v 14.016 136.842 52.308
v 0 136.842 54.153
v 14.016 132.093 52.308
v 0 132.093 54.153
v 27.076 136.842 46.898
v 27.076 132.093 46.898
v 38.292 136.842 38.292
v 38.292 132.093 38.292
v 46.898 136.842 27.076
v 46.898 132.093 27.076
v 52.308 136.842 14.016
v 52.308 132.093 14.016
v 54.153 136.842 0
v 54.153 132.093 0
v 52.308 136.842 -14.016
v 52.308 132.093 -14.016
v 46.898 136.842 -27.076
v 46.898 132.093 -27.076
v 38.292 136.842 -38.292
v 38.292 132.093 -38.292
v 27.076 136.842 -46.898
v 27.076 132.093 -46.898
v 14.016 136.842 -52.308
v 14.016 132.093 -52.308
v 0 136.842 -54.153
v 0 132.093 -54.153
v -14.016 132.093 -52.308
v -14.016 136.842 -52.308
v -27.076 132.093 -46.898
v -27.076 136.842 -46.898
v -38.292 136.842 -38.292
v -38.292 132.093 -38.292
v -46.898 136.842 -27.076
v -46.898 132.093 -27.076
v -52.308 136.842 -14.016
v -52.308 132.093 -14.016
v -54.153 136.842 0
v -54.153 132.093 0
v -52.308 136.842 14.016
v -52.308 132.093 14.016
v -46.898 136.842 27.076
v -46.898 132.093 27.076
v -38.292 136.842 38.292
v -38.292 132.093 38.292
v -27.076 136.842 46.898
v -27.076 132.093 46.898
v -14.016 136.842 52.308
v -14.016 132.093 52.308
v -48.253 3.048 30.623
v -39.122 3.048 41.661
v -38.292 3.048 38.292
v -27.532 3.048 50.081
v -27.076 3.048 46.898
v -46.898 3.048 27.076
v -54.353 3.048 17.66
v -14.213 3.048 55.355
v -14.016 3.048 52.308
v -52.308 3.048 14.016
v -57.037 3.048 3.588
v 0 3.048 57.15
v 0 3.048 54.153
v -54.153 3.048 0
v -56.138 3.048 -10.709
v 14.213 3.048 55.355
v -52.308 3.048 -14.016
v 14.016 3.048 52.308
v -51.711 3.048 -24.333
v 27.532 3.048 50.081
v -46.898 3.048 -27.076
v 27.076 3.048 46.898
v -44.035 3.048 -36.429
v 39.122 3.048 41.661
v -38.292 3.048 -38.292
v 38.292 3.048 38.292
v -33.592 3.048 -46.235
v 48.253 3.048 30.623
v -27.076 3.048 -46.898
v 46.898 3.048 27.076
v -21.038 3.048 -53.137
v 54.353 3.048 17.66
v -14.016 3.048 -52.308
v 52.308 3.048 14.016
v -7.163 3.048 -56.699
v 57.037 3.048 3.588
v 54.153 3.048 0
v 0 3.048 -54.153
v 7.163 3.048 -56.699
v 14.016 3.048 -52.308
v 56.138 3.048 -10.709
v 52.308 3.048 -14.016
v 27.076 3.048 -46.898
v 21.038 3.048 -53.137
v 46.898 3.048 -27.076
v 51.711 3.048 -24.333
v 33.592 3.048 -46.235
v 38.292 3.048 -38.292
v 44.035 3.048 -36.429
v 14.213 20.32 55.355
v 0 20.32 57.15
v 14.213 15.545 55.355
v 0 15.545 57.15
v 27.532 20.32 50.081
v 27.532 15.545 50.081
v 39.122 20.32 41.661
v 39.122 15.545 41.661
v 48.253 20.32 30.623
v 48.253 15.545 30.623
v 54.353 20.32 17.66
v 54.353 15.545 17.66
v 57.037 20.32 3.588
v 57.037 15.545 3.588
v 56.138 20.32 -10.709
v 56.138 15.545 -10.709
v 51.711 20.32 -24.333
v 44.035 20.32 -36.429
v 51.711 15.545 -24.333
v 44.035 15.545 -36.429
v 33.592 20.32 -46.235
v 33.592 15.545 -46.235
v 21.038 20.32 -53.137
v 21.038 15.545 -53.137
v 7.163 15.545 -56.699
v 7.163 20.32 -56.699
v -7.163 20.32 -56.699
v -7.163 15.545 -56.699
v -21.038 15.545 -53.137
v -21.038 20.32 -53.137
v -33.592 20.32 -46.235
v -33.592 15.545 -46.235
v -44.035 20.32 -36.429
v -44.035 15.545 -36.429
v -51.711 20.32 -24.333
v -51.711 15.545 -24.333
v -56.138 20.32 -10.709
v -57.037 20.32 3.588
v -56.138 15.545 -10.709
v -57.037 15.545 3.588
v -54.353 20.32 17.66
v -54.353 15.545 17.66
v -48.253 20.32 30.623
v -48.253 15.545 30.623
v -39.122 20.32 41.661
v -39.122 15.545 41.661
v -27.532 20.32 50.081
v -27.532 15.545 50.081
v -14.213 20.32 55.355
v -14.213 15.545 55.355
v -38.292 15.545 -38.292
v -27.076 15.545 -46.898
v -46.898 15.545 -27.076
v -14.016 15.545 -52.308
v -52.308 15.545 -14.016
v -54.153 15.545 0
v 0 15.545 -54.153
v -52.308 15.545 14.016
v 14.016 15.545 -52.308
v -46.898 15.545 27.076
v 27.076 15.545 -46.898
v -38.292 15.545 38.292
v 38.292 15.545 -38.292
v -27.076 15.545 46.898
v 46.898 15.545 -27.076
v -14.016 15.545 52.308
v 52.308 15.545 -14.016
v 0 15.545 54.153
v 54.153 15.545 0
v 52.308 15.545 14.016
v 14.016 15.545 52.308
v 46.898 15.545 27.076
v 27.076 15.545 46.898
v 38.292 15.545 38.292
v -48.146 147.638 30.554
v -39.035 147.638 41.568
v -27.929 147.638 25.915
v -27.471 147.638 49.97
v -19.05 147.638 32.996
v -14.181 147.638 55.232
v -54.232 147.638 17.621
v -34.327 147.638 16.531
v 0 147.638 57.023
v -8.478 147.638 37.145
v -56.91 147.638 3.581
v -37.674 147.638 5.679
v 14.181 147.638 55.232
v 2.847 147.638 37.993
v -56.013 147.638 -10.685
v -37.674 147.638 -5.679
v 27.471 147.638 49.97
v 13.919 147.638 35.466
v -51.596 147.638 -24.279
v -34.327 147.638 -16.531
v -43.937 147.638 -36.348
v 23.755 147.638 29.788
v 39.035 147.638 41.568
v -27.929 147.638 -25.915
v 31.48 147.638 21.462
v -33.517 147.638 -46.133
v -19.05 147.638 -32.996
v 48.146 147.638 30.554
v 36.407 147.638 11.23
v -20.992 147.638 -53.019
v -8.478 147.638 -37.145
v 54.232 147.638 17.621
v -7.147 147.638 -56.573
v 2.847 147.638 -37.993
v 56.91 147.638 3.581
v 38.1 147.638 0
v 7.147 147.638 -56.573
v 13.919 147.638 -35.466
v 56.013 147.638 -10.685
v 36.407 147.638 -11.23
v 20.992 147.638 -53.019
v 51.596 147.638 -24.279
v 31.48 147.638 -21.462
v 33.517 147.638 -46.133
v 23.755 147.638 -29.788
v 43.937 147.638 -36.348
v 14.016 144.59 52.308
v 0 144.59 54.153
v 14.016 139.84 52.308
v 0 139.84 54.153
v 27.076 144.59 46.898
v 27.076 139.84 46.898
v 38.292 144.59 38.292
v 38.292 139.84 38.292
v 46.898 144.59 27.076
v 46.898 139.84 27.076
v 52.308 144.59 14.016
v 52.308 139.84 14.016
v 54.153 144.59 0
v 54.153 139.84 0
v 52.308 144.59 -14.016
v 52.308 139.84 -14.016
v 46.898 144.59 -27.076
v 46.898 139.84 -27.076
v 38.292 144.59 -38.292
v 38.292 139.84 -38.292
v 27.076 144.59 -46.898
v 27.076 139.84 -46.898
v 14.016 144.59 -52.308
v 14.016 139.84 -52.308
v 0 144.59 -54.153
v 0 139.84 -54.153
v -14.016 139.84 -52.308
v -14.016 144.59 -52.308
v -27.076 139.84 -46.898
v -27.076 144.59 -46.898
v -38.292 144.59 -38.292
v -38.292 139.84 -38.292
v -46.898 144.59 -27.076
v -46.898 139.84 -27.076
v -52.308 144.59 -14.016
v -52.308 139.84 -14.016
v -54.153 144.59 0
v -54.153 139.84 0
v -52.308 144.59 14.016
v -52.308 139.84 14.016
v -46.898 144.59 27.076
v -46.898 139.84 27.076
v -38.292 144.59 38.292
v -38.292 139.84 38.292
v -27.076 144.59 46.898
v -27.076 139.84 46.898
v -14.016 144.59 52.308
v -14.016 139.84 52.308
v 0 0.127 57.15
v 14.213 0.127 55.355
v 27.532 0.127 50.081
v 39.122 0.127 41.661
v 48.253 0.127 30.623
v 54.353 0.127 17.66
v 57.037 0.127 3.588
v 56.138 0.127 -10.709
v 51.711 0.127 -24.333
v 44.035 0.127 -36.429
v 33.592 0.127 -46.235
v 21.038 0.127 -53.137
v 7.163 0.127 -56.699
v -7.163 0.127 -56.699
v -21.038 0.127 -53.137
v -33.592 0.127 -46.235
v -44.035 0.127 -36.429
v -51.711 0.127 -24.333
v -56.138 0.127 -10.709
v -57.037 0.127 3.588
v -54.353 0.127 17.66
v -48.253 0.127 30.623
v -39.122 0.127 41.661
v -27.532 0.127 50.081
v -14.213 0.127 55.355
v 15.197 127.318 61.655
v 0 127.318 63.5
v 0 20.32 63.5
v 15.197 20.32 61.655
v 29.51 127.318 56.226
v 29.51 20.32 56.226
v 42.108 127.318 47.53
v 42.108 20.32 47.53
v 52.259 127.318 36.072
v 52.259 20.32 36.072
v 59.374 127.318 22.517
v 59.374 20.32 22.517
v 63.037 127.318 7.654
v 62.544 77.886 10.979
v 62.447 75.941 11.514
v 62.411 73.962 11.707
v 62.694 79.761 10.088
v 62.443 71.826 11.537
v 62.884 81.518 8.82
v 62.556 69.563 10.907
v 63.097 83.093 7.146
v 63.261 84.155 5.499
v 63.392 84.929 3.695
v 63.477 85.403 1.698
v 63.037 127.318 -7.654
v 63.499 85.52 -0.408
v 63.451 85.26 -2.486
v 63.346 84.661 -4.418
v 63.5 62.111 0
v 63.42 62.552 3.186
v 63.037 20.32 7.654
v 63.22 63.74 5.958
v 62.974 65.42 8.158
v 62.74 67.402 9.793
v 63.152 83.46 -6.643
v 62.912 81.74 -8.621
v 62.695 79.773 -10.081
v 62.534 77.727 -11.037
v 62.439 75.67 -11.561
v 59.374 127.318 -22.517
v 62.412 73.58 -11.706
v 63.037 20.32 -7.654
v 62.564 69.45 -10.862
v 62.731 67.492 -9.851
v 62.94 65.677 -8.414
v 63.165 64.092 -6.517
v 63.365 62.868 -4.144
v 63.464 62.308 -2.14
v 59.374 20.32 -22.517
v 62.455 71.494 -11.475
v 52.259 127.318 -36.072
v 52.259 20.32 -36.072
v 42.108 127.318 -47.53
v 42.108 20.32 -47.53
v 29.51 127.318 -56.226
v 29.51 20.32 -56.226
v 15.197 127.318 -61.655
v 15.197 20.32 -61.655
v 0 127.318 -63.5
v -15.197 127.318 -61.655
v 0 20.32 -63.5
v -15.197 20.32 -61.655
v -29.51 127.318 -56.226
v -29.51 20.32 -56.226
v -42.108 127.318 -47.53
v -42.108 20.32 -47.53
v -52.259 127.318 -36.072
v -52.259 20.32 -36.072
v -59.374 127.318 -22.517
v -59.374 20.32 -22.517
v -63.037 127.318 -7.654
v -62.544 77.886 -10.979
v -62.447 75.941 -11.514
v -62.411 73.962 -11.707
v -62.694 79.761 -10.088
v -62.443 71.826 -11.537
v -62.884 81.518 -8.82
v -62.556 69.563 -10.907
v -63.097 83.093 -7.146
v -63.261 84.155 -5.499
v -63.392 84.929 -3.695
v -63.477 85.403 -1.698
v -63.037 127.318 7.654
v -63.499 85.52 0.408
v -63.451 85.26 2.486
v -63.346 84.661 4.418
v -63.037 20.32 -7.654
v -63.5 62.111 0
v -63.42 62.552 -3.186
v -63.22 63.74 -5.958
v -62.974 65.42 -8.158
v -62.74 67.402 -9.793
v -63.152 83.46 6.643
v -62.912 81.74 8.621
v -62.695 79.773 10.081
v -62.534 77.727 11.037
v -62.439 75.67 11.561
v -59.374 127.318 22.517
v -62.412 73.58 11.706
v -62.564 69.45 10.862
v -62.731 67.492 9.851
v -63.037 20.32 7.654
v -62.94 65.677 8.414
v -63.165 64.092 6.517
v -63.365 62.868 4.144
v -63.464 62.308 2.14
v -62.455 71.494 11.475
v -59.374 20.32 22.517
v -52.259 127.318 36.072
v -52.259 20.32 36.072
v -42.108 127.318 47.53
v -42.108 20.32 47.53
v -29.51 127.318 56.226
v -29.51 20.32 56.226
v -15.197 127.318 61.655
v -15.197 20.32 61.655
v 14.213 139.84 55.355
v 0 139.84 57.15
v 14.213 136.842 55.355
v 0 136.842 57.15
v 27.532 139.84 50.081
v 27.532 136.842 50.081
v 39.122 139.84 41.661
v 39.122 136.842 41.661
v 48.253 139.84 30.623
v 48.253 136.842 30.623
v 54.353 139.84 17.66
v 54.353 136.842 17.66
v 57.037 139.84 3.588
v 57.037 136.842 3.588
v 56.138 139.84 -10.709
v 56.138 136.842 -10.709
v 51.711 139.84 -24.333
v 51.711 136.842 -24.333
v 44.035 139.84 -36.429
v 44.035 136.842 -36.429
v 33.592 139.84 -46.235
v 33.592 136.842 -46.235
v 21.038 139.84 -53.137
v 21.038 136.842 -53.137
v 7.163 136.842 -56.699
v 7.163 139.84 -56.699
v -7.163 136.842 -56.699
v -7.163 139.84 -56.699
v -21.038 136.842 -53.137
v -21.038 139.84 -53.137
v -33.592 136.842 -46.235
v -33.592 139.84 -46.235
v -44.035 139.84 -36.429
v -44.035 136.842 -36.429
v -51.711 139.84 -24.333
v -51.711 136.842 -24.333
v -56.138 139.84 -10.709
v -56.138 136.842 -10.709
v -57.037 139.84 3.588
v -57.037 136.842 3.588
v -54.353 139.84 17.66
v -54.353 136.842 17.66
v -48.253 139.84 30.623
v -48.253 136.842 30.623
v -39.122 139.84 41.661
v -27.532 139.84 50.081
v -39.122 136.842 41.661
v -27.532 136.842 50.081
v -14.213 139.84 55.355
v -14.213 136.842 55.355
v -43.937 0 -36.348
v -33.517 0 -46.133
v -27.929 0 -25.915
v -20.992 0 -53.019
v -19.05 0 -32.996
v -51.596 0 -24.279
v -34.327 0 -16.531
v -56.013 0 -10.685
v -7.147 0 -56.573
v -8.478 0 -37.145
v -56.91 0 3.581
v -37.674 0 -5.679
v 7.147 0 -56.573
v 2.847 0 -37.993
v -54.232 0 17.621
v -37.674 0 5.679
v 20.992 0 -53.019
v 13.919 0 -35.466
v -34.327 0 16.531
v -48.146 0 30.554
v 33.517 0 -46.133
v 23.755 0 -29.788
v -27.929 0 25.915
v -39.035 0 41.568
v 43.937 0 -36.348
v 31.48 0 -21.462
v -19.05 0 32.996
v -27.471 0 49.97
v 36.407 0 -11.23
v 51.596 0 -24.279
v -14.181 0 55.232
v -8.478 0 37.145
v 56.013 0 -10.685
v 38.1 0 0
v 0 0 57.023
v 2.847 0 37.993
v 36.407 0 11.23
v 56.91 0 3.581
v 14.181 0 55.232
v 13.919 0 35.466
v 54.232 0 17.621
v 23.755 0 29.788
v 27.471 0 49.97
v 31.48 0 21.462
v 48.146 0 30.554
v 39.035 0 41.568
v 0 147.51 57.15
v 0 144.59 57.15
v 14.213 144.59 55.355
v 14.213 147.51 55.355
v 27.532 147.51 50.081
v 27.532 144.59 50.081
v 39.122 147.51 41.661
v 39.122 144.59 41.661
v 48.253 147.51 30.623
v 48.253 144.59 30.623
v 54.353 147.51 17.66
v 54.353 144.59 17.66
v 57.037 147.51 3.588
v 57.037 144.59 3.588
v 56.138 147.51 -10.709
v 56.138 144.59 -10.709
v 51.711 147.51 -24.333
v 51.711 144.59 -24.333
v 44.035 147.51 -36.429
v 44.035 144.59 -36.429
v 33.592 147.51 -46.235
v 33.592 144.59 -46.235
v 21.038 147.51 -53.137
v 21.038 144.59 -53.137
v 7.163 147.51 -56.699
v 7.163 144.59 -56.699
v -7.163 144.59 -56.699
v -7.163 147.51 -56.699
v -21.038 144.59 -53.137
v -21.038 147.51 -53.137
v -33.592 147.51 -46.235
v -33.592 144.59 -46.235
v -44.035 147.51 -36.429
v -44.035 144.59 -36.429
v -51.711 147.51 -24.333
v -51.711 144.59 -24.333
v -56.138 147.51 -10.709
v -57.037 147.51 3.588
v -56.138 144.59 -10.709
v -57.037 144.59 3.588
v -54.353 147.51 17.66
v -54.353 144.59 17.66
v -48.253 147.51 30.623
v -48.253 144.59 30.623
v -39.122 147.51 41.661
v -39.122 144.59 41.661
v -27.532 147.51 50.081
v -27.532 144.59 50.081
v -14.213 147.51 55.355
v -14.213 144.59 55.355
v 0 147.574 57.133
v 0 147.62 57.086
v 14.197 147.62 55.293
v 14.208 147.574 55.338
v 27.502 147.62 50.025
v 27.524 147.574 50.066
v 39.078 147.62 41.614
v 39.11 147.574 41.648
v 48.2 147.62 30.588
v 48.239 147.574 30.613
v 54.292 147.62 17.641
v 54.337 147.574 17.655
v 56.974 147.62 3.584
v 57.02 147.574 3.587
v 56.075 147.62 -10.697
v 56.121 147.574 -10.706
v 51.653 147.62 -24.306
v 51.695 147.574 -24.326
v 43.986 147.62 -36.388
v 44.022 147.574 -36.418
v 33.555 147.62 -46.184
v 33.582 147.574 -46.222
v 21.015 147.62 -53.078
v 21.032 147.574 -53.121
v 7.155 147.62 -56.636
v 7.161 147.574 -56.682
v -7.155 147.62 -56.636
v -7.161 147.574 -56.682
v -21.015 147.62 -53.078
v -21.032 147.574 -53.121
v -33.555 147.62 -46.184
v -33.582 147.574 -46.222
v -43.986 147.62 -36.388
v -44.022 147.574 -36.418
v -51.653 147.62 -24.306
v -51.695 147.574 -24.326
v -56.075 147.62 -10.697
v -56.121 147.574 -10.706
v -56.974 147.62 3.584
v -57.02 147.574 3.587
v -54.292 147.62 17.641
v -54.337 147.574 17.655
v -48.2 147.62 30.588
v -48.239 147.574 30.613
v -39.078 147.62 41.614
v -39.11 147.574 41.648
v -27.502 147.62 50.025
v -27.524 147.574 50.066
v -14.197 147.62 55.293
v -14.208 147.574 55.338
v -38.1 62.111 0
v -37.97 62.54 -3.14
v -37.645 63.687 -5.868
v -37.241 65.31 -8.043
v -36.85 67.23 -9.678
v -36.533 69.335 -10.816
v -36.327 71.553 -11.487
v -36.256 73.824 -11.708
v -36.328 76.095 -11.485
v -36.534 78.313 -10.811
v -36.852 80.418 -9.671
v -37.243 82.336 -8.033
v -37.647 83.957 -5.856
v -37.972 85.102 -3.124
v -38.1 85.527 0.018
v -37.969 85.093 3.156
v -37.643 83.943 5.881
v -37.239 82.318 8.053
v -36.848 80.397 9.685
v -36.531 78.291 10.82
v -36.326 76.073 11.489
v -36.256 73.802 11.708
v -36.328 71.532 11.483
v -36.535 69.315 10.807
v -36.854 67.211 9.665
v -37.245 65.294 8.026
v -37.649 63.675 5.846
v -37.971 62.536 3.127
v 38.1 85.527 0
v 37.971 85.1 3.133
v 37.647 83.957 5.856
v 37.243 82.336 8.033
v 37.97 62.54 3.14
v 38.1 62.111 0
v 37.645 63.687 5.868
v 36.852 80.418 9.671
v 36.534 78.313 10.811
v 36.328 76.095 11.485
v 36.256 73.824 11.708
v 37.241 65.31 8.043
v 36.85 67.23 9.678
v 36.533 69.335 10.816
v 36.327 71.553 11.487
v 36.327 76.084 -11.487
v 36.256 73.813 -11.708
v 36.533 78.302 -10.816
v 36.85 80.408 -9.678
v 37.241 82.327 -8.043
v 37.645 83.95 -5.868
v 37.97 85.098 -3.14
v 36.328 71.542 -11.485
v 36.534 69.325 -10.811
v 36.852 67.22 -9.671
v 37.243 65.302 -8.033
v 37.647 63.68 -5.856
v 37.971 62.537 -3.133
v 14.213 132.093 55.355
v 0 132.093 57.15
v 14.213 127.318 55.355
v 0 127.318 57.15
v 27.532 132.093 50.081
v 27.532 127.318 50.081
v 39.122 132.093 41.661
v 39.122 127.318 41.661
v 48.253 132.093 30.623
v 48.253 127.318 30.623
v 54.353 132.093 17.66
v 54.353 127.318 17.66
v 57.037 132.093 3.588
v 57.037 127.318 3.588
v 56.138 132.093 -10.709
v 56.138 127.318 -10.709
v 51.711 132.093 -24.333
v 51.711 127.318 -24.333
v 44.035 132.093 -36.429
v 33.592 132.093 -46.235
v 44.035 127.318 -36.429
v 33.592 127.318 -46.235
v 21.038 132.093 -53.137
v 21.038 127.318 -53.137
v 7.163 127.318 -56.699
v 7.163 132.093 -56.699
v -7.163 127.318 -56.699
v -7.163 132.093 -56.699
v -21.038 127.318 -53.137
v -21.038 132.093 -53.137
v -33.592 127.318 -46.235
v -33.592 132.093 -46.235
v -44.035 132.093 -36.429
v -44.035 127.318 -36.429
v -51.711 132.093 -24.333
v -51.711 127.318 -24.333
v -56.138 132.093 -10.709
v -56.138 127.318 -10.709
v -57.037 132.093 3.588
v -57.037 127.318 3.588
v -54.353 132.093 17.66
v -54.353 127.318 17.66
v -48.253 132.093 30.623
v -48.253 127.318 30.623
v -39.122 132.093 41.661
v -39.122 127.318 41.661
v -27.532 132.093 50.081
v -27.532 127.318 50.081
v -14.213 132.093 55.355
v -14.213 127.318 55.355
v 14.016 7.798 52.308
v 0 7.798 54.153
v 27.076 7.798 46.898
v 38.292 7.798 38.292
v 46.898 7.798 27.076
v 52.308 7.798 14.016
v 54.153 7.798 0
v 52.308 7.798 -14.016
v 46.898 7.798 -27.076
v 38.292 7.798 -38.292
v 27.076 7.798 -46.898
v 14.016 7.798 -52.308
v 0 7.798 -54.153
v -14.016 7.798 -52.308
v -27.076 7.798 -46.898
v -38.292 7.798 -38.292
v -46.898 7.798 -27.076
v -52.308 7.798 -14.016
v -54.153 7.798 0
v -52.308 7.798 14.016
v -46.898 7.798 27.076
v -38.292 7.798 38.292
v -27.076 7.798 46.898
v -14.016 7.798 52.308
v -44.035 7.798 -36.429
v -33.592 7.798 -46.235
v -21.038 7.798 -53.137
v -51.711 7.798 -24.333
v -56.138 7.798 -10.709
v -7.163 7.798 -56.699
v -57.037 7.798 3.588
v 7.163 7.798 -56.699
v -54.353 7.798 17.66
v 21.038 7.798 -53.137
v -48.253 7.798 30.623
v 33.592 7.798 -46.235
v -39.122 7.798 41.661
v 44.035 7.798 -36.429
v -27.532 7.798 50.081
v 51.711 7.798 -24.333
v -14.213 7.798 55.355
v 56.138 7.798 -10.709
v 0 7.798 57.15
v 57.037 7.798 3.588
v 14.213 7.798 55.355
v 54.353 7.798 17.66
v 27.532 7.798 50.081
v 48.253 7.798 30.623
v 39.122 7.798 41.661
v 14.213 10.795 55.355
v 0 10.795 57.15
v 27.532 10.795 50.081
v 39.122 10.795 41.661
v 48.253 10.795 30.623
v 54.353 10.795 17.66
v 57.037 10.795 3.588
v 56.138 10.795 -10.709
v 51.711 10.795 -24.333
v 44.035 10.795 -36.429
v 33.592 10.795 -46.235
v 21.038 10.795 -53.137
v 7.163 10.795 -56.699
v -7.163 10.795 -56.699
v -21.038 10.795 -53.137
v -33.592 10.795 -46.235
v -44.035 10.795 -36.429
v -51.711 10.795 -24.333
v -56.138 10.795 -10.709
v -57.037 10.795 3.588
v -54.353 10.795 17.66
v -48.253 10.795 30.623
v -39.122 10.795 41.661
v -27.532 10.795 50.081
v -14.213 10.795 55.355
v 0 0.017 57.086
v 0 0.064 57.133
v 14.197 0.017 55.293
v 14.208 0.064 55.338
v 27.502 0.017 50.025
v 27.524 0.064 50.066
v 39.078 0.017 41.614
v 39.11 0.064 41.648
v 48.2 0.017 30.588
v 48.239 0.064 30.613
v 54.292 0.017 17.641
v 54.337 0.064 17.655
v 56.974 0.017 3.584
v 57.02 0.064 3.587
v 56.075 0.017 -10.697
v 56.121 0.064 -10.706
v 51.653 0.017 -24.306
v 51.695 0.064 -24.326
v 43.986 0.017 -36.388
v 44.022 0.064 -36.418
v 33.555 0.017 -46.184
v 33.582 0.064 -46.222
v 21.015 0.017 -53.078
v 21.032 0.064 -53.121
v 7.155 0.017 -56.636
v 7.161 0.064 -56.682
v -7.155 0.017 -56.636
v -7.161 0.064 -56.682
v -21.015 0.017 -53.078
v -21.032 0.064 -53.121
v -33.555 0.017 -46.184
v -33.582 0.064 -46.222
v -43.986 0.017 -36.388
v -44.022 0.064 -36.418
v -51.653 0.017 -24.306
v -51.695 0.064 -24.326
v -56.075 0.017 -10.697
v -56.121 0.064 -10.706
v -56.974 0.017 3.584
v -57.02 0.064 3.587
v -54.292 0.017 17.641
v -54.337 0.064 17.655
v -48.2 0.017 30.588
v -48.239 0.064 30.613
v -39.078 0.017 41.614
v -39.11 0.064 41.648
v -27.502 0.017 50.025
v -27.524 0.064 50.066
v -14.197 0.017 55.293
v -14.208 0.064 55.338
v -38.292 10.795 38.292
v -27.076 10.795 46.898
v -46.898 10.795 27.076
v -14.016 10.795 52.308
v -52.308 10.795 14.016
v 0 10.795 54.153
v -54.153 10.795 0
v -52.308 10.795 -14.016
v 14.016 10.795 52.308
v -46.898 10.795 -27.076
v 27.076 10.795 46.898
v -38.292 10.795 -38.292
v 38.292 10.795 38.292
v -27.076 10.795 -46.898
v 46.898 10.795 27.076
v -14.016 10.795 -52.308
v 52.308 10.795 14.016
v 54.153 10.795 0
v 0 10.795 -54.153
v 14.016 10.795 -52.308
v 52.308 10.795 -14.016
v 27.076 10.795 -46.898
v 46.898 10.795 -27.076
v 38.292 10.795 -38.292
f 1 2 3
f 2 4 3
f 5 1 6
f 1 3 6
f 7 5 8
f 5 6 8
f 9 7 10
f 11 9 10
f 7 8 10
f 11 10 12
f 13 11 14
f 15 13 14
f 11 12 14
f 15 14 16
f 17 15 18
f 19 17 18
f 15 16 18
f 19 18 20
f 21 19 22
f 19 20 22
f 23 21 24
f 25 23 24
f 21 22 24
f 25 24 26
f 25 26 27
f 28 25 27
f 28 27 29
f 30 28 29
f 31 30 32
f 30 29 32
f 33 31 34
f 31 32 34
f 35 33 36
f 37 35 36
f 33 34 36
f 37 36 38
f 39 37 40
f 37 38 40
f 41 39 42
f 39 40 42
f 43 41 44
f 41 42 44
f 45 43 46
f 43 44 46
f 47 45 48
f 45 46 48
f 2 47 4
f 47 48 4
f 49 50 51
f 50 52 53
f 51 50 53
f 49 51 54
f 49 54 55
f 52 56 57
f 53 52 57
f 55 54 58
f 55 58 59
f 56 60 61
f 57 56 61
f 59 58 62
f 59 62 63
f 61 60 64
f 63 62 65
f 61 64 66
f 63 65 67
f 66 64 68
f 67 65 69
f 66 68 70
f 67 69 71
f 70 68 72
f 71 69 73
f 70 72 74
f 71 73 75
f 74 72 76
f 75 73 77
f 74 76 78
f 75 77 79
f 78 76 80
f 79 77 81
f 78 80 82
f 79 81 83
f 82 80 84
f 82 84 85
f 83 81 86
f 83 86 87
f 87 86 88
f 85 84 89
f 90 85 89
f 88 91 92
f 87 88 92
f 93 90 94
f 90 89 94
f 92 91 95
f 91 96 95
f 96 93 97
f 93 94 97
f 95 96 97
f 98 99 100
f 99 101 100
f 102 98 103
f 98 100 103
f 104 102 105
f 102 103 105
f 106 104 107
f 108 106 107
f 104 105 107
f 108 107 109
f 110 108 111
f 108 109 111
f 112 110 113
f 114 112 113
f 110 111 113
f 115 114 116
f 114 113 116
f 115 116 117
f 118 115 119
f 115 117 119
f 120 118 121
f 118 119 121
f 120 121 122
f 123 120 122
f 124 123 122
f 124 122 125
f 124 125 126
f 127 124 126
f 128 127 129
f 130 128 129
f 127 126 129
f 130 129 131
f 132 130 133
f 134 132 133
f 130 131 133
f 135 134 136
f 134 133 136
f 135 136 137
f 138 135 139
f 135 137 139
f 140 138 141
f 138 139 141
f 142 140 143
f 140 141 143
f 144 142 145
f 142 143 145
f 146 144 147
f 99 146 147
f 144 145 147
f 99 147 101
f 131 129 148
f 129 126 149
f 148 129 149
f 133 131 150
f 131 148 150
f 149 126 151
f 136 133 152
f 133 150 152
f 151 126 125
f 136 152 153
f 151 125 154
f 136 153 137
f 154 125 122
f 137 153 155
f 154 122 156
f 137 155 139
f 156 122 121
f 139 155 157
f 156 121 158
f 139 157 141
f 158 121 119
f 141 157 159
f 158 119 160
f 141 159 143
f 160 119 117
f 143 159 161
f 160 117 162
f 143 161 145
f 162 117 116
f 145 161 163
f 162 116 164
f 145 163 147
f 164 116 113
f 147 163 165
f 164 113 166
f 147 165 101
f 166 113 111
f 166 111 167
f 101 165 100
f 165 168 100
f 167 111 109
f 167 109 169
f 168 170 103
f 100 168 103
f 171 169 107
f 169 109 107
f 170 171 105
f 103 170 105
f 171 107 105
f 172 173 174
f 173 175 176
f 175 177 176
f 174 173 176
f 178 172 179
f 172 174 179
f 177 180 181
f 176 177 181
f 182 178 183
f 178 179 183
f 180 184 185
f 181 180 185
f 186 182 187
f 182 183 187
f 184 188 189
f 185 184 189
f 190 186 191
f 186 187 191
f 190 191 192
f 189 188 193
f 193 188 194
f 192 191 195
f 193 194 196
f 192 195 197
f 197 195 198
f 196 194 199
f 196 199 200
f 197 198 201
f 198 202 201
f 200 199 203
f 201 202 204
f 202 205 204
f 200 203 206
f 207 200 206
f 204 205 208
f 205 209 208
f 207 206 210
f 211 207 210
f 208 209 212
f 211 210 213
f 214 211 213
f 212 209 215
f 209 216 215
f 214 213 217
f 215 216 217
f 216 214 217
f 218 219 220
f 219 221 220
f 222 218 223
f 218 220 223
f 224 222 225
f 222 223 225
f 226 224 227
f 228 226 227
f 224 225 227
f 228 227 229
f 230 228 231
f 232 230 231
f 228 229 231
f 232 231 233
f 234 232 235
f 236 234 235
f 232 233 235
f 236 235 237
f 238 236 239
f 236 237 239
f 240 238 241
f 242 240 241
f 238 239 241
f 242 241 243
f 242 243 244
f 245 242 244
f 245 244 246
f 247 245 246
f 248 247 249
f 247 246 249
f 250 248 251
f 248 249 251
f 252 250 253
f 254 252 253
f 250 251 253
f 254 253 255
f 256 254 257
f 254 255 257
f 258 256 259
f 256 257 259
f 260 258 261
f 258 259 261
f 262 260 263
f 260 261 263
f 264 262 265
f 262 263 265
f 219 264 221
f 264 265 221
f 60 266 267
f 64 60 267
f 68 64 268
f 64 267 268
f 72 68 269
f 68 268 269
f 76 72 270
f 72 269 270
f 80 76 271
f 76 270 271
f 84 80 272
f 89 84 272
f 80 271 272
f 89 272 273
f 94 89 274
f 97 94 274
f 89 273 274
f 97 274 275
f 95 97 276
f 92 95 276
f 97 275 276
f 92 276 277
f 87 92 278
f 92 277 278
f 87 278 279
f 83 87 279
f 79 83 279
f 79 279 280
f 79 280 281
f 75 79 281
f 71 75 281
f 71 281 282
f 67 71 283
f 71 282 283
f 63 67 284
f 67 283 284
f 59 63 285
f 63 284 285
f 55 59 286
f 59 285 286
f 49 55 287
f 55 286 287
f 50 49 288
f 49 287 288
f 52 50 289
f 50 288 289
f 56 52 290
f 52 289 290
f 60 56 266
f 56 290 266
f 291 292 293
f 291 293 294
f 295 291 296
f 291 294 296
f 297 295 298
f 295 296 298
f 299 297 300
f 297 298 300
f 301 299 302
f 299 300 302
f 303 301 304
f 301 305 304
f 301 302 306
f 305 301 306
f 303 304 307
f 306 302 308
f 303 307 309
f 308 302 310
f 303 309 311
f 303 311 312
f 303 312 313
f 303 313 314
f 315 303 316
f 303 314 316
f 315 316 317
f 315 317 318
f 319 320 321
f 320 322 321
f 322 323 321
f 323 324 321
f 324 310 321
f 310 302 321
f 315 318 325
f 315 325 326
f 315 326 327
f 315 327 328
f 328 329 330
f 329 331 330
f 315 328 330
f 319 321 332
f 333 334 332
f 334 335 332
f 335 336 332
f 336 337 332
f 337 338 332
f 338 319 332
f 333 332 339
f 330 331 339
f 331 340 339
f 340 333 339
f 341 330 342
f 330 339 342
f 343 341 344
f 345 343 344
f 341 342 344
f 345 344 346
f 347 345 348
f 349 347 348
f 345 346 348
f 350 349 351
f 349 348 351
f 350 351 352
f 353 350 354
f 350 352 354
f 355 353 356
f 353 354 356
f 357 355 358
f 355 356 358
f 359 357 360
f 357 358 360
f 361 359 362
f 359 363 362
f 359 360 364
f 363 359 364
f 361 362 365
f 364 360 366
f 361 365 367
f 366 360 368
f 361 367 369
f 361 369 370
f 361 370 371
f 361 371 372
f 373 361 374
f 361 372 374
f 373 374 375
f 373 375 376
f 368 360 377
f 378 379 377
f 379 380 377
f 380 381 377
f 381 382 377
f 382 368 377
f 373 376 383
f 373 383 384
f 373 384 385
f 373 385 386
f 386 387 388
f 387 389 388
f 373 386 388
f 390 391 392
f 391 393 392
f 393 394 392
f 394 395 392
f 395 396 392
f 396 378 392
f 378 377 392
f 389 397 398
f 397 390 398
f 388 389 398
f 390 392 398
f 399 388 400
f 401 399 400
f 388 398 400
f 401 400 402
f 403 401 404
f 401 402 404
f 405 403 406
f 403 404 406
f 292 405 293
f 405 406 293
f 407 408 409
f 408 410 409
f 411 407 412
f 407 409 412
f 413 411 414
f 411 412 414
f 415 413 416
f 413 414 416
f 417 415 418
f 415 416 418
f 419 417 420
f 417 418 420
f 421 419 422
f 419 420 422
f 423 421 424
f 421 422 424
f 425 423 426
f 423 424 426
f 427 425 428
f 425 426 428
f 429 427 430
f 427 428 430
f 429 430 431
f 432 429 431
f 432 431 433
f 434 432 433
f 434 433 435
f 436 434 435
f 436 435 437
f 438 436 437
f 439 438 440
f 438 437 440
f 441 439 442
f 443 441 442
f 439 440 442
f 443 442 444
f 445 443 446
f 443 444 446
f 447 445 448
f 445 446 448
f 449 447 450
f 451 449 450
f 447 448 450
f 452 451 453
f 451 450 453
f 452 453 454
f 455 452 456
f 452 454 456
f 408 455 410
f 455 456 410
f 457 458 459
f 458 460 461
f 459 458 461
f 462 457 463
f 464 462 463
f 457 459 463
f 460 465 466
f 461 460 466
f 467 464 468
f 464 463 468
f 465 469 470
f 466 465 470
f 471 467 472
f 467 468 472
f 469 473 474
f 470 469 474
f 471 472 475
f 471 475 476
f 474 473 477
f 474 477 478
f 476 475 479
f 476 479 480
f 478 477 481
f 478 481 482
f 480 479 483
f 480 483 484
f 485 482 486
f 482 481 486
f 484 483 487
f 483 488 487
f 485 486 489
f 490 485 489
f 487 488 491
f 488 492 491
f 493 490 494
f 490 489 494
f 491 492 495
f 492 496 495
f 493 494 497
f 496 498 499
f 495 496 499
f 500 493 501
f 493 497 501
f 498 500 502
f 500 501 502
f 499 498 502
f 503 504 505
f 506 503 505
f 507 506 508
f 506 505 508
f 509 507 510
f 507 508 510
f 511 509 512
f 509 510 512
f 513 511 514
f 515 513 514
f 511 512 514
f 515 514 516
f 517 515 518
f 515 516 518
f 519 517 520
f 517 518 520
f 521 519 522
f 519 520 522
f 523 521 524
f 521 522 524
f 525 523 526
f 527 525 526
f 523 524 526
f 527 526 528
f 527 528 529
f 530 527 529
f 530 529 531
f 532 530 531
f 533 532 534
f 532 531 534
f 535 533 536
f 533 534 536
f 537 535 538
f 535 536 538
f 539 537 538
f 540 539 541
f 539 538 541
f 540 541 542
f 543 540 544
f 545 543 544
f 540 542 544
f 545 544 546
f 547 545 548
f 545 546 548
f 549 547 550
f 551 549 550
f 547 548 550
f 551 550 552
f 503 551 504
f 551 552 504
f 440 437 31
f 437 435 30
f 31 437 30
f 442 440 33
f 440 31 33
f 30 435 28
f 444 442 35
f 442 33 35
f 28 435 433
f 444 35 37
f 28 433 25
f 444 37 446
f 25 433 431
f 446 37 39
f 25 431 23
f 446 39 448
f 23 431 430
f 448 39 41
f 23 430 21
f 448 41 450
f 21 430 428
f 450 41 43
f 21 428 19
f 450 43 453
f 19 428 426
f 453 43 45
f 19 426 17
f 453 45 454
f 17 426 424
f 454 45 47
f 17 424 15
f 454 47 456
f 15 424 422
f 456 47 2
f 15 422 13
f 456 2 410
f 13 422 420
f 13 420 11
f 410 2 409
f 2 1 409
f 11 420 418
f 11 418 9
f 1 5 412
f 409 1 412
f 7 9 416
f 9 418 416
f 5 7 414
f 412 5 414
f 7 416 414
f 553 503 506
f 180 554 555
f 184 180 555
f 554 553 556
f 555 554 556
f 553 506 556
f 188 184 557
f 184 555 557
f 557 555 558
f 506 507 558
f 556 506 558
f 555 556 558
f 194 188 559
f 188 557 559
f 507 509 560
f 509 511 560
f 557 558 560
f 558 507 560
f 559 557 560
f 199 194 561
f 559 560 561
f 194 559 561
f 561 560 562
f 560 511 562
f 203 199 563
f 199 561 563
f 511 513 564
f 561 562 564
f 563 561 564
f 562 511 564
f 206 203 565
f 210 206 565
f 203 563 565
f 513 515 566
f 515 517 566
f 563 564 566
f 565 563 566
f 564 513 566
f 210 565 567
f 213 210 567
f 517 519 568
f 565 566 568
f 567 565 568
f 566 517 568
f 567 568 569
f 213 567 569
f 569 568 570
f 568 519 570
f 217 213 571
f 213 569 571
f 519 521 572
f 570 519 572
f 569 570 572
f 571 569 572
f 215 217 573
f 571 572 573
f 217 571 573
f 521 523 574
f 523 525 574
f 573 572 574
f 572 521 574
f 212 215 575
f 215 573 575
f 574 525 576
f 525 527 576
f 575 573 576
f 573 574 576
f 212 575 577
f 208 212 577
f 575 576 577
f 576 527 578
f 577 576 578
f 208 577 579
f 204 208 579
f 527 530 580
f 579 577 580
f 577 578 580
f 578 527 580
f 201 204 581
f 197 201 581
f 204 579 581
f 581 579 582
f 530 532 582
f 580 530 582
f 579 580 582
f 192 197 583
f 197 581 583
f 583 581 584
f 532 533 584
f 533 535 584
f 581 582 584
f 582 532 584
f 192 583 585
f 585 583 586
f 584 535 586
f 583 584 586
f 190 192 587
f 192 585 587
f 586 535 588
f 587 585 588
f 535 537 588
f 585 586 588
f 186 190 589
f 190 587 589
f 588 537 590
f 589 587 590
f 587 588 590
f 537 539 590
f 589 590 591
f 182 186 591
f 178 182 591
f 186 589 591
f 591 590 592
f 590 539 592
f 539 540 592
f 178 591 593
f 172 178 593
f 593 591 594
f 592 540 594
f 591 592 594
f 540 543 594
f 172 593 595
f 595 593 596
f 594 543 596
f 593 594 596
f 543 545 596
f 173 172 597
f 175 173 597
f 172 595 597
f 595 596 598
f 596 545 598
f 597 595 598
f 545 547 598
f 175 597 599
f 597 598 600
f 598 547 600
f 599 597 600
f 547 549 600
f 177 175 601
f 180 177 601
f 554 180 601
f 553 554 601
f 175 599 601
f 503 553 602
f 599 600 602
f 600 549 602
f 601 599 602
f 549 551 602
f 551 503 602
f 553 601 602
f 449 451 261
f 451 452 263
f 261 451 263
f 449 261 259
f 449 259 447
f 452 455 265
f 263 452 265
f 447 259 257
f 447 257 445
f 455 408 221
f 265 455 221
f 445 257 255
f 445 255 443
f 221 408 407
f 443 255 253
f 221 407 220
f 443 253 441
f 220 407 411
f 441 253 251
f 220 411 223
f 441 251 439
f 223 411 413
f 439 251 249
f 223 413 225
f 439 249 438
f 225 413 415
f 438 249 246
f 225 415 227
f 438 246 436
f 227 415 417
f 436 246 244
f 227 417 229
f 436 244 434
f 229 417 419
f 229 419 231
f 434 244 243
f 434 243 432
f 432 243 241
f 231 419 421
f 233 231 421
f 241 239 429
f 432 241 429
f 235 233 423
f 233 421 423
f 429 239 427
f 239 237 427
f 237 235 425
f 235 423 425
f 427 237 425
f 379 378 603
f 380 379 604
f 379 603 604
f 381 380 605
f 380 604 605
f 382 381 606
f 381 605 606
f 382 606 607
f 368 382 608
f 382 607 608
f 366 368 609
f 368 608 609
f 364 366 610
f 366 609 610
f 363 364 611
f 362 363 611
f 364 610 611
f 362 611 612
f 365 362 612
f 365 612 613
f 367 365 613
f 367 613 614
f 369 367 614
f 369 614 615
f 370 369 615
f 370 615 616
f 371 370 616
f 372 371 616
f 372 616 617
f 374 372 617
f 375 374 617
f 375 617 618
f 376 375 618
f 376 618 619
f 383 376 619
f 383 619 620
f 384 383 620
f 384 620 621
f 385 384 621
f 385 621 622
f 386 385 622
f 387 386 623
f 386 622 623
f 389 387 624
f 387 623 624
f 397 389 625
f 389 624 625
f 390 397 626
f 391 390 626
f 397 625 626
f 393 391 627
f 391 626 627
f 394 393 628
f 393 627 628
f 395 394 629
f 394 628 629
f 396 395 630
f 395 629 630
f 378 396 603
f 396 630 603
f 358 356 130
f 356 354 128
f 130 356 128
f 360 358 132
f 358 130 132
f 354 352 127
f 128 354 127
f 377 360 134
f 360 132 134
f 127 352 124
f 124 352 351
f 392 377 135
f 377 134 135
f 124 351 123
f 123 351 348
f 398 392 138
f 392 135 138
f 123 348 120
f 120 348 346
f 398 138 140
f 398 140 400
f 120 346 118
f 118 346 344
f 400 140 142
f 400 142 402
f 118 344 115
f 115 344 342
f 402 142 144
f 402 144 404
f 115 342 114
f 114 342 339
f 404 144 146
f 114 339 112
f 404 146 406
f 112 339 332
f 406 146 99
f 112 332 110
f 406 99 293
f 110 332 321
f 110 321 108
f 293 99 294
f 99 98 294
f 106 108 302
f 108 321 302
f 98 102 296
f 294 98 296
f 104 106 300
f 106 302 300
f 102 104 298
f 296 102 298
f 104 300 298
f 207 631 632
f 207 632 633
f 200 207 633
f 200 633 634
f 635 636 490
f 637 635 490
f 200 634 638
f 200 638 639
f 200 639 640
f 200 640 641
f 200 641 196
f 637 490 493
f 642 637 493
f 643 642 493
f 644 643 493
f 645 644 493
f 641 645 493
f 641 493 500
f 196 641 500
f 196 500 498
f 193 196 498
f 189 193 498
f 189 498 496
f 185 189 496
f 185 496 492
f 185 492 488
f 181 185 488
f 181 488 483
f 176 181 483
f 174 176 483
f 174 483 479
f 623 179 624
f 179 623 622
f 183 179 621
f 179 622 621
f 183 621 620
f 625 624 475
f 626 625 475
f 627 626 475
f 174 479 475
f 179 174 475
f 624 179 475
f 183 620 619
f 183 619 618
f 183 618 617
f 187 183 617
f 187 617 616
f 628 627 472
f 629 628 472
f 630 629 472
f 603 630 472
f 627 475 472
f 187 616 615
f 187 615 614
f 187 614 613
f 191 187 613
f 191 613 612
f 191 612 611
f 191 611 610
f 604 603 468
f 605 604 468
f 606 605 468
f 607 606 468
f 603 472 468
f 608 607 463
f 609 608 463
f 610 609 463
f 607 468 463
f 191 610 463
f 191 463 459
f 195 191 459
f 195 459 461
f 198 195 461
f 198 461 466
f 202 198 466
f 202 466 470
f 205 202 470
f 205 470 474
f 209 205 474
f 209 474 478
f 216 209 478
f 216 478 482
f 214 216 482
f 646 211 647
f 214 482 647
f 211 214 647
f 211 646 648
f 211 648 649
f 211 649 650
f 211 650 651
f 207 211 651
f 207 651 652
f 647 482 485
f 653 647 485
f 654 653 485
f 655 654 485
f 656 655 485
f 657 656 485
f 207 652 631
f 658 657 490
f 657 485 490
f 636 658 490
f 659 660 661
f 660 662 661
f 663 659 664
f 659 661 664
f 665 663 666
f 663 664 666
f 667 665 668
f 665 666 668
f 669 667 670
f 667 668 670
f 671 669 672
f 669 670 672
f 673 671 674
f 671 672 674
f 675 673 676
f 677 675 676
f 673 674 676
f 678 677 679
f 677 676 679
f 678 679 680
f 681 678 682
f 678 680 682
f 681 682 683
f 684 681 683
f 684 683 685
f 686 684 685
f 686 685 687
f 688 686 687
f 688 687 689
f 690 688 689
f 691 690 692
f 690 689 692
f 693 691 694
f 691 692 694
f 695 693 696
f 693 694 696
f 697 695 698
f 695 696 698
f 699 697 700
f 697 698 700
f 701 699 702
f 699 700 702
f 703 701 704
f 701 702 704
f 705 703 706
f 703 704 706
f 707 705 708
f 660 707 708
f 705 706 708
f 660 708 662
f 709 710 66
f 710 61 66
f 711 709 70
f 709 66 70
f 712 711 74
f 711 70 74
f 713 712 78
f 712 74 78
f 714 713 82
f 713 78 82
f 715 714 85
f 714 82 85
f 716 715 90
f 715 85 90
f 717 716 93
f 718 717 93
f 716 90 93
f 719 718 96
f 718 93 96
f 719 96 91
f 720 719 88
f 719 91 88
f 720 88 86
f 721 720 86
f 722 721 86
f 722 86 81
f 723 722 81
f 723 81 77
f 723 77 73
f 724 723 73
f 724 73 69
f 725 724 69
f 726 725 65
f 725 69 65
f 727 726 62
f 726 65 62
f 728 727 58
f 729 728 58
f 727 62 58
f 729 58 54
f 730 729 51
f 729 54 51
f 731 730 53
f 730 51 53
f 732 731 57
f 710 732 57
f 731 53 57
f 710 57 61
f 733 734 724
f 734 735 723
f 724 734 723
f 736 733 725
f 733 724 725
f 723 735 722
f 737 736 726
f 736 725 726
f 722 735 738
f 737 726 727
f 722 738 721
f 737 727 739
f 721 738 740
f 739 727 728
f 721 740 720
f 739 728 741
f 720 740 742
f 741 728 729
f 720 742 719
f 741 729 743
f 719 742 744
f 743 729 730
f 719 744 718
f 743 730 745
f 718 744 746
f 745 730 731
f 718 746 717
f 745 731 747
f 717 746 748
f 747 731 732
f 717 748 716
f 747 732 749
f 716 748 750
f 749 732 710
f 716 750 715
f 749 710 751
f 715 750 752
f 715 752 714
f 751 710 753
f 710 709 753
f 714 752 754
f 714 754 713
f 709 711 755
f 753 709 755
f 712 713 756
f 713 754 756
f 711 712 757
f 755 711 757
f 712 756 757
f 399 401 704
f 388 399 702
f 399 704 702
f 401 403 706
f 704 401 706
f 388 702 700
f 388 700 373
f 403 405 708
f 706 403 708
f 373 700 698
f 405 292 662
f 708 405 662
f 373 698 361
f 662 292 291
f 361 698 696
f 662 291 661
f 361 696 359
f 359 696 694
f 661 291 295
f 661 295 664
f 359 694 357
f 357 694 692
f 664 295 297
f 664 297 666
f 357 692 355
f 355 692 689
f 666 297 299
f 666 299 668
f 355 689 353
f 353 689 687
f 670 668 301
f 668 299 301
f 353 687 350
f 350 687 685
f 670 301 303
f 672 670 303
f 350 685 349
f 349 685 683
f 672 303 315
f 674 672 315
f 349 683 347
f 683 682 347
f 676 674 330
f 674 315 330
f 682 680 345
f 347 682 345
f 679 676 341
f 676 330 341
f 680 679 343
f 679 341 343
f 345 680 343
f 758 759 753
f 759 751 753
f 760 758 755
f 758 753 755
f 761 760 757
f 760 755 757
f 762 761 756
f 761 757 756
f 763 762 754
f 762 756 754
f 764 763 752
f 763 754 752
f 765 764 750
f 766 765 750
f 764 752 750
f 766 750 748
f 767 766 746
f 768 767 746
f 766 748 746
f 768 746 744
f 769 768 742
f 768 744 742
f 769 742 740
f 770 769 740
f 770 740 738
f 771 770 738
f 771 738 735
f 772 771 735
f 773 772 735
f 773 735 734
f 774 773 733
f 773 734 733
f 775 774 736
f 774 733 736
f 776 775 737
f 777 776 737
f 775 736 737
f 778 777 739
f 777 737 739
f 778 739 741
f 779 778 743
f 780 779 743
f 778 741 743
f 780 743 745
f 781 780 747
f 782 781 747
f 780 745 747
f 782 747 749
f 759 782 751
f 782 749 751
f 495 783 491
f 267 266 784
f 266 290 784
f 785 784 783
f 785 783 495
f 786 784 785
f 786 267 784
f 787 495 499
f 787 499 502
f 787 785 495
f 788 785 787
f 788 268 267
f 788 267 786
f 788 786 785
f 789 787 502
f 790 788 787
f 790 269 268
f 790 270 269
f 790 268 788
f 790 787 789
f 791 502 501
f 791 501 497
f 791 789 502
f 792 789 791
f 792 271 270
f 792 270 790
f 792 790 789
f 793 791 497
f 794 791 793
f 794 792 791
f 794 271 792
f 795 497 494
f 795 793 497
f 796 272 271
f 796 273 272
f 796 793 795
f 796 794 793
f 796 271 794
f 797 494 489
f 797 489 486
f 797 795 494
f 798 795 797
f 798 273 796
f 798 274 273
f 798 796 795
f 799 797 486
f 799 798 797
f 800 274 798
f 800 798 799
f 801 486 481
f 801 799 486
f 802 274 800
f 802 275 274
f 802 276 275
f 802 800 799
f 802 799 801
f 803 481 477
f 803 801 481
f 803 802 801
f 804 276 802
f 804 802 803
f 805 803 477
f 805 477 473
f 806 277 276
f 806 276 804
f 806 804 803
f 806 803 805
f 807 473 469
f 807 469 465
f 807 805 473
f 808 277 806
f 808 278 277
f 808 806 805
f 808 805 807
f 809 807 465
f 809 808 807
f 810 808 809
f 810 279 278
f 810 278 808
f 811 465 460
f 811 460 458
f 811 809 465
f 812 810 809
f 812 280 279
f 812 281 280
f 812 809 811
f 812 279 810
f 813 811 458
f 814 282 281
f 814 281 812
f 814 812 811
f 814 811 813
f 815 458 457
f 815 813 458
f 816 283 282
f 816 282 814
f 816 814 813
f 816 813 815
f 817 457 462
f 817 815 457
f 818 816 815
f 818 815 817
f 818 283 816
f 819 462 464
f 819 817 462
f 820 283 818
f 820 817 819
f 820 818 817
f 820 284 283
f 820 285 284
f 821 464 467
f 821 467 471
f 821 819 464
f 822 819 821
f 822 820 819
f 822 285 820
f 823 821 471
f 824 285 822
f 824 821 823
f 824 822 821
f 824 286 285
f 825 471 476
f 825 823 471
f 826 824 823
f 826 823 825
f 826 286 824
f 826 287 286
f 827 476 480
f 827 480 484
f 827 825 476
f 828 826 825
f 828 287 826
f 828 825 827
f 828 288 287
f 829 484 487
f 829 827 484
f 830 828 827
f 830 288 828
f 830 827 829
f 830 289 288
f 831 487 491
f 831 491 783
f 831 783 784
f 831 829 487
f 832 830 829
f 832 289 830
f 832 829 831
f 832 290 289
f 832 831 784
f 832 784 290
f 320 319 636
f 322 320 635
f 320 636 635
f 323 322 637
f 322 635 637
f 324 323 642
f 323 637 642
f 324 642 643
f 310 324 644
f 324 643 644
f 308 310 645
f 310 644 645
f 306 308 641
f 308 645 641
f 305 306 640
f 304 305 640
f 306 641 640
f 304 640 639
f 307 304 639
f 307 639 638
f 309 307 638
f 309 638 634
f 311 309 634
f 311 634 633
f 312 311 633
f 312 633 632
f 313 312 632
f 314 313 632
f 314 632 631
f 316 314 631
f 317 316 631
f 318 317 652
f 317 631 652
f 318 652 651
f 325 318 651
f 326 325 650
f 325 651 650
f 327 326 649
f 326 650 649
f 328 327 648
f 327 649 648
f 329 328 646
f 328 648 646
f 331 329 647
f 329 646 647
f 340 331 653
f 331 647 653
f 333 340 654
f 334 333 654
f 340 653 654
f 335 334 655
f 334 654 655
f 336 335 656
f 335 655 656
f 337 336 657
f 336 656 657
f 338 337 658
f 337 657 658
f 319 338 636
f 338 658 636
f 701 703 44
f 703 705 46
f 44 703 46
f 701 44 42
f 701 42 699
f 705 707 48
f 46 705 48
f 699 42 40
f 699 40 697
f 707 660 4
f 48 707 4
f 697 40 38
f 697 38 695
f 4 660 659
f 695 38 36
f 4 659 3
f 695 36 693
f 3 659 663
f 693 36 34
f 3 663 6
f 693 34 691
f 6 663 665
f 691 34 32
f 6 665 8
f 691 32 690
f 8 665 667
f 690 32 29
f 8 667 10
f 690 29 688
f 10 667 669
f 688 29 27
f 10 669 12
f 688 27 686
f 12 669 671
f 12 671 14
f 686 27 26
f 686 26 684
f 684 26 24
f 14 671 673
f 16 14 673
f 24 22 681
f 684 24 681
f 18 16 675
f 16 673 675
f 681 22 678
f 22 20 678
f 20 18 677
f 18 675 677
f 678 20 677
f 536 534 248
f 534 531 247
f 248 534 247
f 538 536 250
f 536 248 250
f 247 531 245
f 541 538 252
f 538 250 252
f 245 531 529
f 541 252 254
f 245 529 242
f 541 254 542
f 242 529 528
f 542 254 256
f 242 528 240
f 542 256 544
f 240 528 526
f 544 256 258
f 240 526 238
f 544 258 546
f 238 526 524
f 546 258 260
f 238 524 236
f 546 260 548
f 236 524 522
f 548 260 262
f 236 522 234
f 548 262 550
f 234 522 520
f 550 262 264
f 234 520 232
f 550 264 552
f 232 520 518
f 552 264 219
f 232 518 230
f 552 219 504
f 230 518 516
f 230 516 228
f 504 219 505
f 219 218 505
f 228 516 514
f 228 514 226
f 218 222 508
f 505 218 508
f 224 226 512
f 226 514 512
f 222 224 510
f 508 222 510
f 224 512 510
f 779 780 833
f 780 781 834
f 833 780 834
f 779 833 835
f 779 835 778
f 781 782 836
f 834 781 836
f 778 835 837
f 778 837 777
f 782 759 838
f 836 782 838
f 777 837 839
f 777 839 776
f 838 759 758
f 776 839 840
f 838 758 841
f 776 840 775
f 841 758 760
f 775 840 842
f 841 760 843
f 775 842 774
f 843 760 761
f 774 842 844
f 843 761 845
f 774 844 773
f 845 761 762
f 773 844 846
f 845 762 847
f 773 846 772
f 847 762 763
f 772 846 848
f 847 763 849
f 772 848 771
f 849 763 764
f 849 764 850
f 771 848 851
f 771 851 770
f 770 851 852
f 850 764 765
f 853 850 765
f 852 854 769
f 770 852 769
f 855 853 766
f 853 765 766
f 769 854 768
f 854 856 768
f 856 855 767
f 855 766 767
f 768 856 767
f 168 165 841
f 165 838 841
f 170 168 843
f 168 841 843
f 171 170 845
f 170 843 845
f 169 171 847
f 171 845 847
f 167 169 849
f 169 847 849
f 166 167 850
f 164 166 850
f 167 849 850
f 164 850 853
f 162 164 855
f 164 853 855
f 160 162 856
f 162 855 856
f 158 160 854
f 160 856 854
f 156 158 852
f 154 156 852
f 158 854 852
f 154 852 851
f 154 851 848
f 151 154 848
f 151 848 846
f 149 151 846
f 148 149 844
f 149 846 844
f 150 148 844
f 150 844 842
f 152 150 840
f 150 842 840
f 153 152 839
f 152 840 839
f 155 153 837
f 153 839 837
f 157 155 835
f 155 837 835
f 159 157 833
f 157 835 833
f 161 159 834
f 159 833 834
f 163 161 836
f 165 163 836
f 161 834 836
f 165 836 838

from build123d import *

# Parameters (mm, degrees)
F2_R      = 38.1
F3_DEPTH  = 147.6375
F4_R      = 0.127
F7_D      = 23.41626
F7_DEPTH  = 38.1
F7_START  = 1.0887055
F7_TIP    = 7.0349542395
F10_D     = 23.41626
F10_DEPTH = 38.1
F10_START = 1.0887055
F10_TIP   = 7.0349542395


with BuildPart() as f1:
    # F0 (on Right) → F1 (revolve)
    with BuildSketch(Plane.YZ):
        Polygon((0, 57.15), (0, 0), (147.6375, 0), (147.6375, 57.15), (144.5895, 57.15), (144.5895, 54.1528), (139.8397, 54.1528), (139.8397, 57.15), (136.8425, 57.15), (136.8425, 54.1528), (132.0927, 54.1528), (132.0927, 57.15), (127.3175, 57.15), (127.3175, 63.5), (20.32, 63.5), (20.32, 57.15), (15.5448, 57.15), (15.5448, 54.1528), (10.795, 54.1528), (10.795, 57.15), (7.7978, 57.15), (7.7978, 54.1528), (3.048, 54.1528), (3.048, 57.15), align=None)
    revolve(axis=Axis((0, 73.81875, 0), (0, 1, 0)))

    # F2 (on face) → F3 (cut, through all)
    with BuildSketch(Plane.XZ):
        Circle(F2_R)
    extrude(amount=-F3_DEPTH, mode=Mode.SUBTRACT)

    # F4
    f4_edges = [f1.edges().sort_by_distance(p)[0] for p in [
        (0, 0, -57.15),
        (0, 147.6375, -57.15),
    ]]
    fillet(f4_edges, radius=F4_R)

    # F7
    # its depths count from where the whole tool has entered the part; down to there all is cleared
    with Locations(Plane.YZ.offset(63.5).offset(-F7_START)):
        with Locations((73.81875, 0)):
            Hole(F7_D / 2, depth=F7_DEPTH)
            with Locations((0, 0, -(F7_DEPTH + F7_TIP / 2))):  # 118° drill point
                Cone(0, F7_D / 2, F7_TIP, mode=Mode.SUBTRACT)

    # F10
    # its depths count from where the whole tool has entered the part; down to there all is cleared
    with Locations(Plane(origin=(-63.5, 0, 0), x_dir=(0, 1, 0), z_dir=(-1, 0, 0)).offset(-F10_START)):
        with Locations((73.81875, 0)):
            Hole(F10_D / 2, depth=F10_DEPTH)
            with Locations((0, 0, -(F10_DEPTH + F10_TIP / 2))):  # 118° drill point
                Cone(0, F10_D / 2, F10_TIP, mode=Mode.SUBTRACT)


solid = f1.part
